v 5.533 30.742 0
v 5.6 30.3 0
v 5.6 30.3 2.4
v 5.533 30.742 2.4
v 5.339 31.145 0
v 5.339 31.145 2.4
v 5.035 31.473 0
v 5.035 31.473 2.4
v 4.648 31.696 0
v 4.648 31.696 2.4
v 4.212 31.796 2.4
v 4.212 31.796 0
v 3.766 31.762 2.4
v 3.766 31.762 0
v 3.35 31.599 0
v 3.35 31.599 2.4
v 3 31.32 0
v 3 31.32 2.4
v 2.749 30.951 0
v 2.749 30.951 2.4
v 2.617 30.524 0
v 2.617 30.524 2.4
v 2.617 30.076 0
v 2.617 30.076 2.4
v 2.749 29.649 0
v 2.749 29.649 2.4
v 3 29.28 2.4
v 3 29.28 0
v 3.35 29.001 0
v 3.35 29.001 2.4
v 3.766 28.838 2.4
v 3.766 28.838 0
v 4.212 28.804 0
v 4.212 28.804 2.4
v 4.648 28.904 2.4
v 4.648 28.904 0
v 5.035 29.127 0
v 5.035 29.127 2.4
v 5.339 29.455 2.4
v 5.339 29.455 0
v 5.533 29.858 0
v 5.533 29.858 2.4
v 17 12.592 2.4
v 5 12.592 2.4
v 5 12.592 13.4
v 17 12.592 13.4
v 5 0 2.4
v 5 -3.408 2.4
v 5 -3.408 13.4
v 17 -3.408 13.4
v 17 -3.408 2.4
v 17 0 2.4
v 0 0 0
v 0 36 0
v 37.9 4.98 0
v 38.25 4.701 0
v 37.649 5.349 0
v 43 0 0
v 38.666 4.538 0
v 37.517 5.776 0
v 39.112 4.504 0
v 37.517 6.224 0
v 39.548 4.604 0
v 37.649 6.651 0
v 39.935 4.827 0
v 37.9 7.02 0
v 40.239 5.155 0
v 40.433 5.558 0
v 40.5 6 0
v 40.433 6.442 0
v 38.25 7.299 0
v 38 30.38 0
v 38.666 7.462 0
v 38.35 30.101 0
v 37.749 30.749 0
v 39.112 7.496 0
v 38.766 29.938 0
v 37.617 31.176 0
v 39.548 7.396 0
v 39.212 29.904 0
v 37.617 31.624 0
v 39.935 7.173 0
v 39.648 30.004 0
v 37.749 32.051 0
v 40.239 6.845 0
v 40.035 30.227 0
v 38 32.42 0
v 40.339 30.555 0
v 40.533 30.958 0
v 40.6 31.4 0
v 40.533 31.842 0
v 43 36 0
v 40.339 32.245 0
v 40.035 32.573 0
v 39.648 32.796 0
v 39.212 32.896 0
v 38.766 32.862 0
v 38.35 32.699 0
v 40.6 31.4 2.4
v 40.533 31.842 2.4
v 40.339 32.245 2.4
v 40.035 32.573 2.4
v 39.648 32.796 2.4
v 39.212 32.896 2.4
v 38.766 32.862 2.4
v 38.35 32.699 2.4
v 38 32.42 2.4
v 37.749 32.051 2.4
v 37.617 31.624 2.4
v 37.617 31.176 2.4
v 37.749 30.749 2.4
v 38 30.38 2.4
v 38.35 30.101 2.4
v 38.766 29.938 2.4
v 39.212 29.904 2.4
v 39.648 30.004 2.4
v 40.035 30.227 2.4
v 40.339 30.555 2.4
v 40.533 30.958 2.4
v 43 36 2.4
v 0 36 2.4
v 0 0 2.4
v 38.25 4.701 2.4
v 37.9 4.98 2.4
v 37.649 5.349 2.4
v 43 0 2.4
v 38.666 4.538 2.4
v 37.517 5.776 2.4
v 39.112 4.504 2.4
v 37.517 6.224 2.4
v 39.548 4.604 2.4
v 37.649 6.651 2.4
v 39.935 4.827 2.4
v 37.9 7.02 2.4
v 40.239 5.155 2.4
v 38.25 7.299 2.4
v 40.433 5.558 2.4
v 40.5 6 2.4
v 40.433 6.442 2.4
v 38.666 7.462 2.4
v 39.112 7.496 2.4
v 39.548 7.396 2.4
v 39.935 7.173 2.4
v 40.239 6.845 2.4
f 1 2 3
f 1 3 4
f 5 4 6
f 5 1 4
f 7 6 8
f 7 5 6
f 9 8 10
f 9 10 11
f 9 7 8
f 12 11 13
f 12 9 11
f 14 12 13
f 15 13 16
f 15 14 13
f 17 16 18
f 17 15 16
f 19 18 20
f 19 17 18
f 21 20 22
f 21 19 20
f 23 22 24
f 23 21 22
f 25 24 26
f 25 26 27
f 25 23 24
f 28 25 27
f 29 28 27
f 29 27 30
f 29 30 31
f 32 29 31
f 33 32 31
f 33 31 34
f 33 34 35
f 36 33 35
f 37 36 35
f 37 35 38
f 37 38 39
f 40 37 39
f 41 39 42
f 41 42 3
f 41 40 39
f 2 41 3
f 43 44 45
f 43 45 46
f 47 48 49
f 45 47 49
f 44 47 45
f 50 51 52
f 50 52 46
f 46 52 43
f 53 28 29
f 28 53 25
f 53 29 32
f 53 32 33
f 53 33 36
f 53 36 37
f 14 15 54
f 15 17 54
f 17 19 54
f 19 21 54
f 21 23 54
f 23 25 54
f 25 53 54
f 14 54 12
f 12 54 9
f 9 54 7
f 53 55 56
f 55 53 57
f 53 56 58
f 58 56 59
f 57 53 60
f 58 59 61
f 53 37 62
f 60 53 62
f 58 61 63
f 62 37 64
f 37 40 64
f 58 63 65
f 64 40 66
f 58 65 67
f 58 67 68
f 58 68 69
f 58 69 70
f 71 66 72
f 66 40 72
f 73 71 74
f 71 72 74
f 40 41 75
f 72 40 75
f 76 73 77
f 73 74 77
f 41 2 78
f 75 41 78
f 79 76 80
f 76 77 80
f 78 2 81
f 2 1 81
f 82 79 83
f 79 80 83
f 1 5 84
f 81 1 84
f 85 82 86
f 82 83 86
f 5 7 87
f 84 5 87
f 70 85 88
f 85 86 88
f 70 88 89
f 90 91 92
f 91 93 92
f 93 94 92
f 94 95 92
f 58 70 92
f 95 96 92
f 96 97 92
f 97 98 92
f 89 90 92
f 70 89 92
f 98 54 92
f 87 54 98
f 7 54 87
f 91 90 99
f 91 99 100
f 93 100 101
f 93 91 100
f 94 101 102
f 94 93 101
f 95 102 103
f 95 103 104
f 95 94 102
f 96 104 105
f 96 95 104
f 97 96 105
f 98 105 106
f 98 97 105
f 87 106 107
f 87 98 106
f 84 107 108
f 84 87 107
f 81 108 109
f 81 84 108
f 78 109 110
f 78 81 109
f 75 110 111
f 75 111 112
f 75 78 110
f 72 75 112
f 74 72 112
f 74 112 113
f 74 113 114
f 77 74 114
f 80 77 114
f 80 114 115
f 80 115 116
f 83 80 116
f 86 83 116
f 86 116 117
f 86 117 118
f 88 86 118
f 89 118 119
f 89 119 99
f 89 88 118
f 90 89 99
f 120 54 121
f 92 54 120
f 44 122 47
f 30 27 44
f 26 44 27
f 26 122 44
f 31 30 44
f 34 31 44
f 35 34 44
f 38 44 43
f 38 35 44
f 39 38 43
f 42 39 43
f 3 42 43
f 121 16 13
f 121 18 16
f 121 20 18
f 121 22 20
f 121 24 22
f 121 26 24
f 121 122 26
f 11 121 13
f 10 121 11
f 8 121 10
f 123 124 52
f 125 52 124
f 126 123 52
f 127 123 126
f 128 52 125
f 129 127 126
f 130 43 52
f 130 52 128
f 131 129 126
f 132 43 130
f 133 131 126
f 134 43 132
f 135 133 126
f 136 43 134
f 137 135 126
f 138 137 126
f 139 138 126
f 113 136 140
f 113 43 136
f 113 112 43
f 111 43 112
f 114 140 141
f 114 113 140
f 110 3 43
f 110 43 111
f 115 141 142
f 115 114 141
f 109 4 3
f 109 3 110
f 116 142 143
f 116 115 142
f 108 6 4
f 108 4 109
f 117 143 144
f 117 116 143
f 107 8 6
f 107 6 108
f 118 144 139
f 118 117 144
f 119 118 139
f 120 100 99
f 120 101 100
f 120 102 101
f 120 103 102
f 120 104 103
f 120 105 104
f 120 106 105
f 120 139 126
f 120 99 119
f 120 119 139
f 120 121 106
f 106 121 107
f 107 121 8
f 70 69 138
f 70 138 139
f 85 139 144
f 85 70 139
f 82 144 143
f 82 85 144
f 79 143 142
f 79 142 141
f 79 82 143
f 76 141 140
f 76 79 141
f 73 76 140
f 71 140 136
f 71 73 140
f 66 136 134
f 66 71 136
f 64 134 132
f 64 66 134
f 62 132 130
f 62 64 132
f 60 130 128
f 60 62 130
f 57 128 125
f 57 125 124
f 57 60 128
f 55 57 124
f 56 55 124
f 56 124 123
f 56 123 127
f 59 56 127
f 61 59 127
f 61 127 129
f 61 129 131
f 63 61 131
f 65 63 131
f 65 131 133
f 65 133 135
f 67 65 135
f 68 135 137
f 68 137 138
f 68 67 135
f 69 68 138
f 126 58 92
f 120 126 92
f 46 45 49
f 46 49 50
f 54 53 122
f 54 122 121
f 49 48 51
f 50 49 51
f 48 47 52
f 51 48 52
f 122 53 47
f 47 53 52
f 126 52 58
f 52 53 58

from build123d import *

# Parameters (mm, degrees)
SKETCH1_W           = 43
SKETCH1_H           = 36
SKETCH1_R           = 1.5
BOSS_EXTRUDE1_DEPTH = 2.4
SKETCH2_W           = 12
SKETCH2_H           = 16
BOSS_EXTRUDE2_DEPTH = 11


with BuildPart() as part:
    # Sketch1 → Boss-Extrude1 (new body)
    with BuildSketch(Plane.XY):
        with Locations((21.5, 18)):
            Rectangle(SKETCH1_W, SKETCH1_H)
        with Locations((39, 6)):
            Circle(SKETCH1_R, mode=Mode.SUBTRACT)
        with Locations((4.1, 30.3)):
            Circle(SKETCH1_R, mode=Mode.SUBTRACT)
        with Locations((39.1, 31.4)):
            Circle(SKETCH1_R, mode=Mode.SUBTRACT)
    extrude(amount=BOSS_EXTRUDE1_DEPTH)

    # Sketch2 → Boss-Extrude2 (add)
    with BuildSketch(Plane.XY.offset(2.4)):
        with Locations((11, 4.591861043)):
            Rectangle(SKETCH2_W, SKETCH2_H)
    extrude(amount=BOSS_EXTRUDE2_DEPTH)


solid = part.part
